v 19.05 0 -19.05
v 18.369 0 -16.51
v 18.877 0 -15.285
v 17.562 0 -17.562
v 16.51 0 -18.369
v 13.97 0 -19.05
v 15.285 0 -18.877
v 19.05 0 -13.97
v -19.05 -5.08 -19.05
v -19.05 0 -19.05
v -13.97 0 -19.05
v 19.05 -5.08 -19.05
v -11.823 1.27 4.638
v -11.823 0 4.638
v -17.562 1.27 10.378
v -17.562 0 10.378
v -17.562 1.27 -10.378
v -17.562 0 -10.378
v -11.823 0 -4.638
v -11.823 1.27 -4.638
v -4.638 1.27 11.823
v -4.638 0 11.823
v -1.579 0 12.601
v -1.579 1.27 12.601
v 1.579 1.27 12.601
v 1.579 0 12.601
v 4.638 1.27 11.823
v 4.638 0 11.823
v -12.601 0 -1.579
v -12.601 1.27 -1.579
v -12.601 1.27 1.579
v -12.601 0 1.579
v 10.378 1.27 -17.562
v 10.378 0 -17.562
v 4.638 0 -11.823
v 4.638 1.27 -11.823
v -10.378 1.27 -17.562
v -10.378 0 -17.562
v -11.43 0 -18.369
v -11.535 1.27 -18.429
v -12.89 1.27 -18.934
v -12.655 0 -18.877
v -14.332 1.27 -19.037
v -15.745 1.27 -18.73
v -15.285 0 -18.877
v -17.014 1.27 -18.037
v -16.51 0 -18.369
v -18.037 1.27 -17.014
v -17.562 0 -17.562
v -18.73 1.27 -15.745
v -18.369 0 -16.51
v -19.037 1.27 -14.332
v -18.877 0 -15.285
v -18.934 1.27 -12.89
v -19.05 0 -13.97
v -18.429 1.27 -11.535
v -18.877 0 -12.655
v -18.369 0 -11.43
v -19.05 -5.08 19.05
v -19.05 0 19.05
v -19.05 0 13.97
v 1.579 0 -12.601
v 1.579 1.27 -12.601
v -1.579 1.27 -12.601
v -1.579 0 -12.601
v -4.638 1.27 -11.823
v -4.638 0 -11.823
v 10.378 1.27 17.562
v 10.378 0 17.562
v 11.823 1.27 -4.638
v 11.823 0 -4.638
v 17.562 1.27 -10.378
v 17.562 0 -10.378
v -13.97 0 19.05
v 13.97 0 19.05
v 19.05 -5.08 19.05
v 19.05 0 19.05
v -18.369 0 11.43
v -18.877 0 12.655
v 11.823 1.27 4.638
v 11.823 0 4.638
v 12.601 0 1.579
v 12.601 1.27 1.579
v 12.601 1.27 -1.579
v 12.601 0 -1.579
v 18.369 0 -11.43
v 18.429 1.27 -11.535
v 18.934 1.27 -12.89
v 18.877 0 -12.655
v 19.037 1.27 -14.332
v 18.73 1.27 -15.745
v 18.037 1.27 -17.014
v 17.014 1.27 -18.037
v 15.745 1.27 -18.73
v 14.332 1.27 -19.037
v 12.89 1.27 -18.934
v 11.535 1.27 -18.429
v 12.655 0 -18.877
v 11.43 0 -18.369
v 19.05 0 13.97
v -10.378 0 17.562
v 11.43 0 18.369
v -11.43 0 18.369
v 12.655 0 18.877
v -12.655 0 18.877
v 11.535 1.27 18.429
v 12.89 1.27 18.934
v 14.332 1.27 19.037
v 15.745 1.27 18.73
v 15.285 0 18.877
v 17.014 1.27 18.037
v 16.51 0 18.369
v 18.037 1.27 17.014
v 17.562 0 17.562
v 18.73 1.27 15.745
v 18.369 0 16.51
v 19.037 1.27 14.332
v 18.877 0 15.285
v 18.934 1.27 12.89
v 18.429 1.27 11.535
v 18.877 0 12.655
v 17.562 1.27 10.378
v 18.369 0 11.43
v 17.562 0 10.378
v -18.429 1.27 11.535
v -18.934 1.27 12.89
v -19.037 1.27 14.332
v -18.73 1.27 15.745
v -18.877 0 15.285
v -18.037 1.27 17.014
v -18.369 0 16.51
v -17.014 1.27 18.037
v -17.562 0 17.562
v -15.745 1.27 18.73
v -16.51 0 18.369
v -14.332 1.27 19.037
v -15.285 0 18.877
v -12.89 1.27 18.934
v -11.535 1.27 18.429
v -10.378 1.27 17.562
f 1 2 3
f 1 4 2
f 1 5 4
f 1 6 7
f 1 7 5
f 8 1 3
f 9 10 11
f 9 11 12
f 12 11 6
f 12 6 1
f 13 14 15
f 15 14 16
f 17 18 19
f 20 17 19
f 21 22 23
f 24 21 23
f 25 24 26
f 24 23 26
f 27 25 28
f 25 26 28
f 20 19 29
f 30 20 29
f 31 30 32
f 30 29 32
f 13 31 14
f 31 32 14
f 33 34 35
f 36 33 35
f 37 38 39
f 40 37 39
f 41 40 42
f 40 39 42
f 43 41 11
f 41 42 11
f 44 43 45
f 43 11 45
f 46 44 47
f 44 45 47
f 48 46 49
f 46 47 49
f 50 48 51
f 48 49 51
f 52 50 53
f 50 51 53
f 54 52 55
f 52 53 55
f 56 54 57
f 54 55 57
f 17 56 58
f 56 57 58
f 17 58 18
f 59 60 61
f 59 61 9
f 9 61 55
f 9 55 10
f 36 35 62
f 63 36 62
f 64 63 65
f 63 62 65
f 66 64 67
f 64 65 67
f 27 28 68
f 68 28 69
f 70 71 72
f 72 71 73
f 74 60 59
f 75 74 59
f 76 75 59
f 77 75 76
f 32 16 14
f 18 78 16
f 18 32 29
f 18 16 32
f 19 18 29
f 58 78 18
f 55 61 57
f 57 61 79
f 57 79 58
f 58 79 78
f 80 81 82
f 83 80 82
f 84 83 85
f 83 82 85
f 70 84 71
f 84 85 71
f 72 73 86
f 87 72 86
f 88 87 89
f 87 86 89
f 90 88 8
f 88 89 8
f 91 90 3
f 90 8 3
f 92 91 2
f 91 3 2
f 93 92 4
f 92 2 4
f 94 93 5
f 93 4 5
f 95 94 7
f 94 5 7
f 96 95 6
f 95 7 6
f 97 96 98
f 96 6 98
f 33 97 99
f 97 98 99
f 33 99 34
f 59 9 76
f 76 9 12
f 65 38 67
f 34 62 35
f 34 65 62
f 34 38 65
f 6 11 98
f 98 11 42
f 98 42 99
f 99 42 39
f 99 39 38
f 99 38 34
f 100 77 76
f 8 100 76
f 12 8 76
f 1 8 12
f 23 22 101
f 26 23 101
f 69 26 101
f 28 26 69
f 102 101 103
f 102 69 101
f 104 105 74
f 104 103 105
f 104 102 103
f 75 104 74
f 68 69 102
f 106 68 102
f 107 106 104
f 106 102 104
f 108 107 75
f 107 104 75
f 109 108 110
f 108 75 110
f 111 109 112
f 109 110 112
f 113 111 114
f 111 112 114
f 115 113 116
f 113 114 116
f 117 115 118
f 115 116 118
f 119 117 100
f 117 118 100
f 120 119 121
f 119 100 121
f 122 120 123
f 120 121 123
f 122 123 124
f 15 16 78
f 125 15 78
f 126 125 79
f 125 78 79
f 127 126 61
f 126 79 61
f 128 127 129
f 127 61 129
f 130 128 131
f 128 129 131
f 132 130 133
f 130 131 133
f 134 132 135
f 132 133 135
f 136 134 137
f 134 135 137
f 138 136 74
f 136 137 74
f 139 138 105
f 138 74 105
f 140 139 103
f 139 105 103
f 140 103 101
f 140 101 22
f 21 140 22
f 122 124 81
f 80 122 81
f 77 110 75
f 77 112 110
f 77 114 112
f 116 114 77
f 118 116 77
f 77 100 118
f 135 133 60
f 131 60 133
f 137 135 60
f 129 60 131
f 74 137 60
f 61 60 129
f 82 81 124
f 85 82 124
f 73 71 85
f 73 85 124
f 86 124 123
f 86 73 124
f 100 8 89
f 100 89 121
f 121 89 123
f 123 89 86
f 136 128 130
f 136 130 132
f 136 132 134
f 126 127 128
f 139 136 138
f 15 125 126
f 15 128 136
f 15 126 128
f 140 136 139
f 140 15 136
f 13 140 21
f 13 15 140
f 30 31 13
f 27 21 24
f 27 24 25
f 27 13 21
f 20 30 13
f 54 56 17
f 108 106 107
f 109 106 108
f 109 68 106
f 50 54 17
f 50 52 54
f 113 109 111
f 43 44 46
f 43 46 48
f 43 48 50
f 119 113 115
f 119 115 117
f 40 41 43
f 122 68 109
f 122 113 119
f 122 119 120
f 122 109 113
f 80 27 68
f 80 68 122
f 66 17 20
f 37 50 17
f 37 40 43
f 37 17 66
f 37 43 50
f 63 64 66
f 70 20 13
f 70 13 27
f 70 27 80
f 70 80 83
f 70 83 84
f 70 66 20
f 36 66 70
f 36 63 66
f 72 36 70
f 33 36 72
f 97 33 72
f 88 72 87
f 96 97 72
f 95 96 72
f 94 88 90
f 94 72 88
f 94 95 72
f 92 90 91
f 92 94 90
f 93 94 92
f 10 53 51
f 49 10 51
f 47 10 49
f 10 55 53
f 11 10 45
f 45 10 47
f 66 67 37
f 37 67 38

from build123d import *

# Parameters (mm, degrees)
SKETCH3_W           = 38.1
SKETCH3_H           = 38.1
BOSS_EXTRUDE2_DEPTH = 5.08
BOSS_EXTRUDE3_DEPTH = 1.27


with BuildPart() as part:
    # Sketch3 → Boss-Extrude2 (new body)
    with BuildSketch(Plane(origin=(0, 0, 0), x_dir=(1, 0, 0), z_dir=(0, 1, 0))):
        Rectangle(SKETCH3_W, SKETCH3_H)
    extrude(amount=-BOSS_EXTRUDE2_DEPTH)

    # Sketch2 → Boss-Extrude3 (add)
    with BuildSketch(Plane(origin=(0, 0, 0), x_dir=(1, 0, 0), z_dir=(0, 1, 0))):
        with BuildLine():
            Line((-17.562102448, 10.377897552), (-11.822643135, 4.638438239))
            ThreePointArc((-11.822643135, 4.638438239), (-12.7, 0), (-11.822643135, -4.638438239))
            Line((-11.822643135, -4.638438239), (-17.562102448, -10.377897552))
            ThreePointArc((-17.562102448, -10.377897552), (-17.562102448, -17.562102448), (-10.377897552, -17.562102448))
            Line((-10.377897552, -17.562102448), (-4.638438239, -11.822643135))
            ThreePointArc((-4.638438239, -11.822643135), (0, -12.7), (4.638438239, -11.822643135))
            Line((4.638438239, -11.822643135), (10.377897552, -17.562102448))
            ThreePointArc((10.377897552, -17.562102448), (17.562102448, -17.562102448), (17.562102448, -10.377897552))
            Line((17.562102448, -10.377897552), (11.822643135, -4.638438239))
            ThreePointArc((11.822643135, -4.638438239), (12.7, 0), (11.822643135, 4.638438239))
            Line((11.822643135, 4.638438239), (17.562102448, 10.377897552))
            ThreePointArc((17.562102448, 10.377897552), (17.562102448, 17.562102448), (10.377897552, 17.562102448))
            Line((10.377897552, 17.562102448), (4.638438239, 11.822643135))
            ThreePointArc((4.638438239, 11.822643135), (0, 12.7), (-4.638438239, 11.822643135))
            Line((-4.638438239, 11.822643135), (-10.377897552, 17.562102448))
            ThreePointArc((-10.377897552, 17.562102448), (-17.562102448, 17.562102448), (-17.562102448, 10.377897552))
        make_face()
    extrude(amount=BOSS_EXTRUDE3_DEPTH)


solid = part.part
